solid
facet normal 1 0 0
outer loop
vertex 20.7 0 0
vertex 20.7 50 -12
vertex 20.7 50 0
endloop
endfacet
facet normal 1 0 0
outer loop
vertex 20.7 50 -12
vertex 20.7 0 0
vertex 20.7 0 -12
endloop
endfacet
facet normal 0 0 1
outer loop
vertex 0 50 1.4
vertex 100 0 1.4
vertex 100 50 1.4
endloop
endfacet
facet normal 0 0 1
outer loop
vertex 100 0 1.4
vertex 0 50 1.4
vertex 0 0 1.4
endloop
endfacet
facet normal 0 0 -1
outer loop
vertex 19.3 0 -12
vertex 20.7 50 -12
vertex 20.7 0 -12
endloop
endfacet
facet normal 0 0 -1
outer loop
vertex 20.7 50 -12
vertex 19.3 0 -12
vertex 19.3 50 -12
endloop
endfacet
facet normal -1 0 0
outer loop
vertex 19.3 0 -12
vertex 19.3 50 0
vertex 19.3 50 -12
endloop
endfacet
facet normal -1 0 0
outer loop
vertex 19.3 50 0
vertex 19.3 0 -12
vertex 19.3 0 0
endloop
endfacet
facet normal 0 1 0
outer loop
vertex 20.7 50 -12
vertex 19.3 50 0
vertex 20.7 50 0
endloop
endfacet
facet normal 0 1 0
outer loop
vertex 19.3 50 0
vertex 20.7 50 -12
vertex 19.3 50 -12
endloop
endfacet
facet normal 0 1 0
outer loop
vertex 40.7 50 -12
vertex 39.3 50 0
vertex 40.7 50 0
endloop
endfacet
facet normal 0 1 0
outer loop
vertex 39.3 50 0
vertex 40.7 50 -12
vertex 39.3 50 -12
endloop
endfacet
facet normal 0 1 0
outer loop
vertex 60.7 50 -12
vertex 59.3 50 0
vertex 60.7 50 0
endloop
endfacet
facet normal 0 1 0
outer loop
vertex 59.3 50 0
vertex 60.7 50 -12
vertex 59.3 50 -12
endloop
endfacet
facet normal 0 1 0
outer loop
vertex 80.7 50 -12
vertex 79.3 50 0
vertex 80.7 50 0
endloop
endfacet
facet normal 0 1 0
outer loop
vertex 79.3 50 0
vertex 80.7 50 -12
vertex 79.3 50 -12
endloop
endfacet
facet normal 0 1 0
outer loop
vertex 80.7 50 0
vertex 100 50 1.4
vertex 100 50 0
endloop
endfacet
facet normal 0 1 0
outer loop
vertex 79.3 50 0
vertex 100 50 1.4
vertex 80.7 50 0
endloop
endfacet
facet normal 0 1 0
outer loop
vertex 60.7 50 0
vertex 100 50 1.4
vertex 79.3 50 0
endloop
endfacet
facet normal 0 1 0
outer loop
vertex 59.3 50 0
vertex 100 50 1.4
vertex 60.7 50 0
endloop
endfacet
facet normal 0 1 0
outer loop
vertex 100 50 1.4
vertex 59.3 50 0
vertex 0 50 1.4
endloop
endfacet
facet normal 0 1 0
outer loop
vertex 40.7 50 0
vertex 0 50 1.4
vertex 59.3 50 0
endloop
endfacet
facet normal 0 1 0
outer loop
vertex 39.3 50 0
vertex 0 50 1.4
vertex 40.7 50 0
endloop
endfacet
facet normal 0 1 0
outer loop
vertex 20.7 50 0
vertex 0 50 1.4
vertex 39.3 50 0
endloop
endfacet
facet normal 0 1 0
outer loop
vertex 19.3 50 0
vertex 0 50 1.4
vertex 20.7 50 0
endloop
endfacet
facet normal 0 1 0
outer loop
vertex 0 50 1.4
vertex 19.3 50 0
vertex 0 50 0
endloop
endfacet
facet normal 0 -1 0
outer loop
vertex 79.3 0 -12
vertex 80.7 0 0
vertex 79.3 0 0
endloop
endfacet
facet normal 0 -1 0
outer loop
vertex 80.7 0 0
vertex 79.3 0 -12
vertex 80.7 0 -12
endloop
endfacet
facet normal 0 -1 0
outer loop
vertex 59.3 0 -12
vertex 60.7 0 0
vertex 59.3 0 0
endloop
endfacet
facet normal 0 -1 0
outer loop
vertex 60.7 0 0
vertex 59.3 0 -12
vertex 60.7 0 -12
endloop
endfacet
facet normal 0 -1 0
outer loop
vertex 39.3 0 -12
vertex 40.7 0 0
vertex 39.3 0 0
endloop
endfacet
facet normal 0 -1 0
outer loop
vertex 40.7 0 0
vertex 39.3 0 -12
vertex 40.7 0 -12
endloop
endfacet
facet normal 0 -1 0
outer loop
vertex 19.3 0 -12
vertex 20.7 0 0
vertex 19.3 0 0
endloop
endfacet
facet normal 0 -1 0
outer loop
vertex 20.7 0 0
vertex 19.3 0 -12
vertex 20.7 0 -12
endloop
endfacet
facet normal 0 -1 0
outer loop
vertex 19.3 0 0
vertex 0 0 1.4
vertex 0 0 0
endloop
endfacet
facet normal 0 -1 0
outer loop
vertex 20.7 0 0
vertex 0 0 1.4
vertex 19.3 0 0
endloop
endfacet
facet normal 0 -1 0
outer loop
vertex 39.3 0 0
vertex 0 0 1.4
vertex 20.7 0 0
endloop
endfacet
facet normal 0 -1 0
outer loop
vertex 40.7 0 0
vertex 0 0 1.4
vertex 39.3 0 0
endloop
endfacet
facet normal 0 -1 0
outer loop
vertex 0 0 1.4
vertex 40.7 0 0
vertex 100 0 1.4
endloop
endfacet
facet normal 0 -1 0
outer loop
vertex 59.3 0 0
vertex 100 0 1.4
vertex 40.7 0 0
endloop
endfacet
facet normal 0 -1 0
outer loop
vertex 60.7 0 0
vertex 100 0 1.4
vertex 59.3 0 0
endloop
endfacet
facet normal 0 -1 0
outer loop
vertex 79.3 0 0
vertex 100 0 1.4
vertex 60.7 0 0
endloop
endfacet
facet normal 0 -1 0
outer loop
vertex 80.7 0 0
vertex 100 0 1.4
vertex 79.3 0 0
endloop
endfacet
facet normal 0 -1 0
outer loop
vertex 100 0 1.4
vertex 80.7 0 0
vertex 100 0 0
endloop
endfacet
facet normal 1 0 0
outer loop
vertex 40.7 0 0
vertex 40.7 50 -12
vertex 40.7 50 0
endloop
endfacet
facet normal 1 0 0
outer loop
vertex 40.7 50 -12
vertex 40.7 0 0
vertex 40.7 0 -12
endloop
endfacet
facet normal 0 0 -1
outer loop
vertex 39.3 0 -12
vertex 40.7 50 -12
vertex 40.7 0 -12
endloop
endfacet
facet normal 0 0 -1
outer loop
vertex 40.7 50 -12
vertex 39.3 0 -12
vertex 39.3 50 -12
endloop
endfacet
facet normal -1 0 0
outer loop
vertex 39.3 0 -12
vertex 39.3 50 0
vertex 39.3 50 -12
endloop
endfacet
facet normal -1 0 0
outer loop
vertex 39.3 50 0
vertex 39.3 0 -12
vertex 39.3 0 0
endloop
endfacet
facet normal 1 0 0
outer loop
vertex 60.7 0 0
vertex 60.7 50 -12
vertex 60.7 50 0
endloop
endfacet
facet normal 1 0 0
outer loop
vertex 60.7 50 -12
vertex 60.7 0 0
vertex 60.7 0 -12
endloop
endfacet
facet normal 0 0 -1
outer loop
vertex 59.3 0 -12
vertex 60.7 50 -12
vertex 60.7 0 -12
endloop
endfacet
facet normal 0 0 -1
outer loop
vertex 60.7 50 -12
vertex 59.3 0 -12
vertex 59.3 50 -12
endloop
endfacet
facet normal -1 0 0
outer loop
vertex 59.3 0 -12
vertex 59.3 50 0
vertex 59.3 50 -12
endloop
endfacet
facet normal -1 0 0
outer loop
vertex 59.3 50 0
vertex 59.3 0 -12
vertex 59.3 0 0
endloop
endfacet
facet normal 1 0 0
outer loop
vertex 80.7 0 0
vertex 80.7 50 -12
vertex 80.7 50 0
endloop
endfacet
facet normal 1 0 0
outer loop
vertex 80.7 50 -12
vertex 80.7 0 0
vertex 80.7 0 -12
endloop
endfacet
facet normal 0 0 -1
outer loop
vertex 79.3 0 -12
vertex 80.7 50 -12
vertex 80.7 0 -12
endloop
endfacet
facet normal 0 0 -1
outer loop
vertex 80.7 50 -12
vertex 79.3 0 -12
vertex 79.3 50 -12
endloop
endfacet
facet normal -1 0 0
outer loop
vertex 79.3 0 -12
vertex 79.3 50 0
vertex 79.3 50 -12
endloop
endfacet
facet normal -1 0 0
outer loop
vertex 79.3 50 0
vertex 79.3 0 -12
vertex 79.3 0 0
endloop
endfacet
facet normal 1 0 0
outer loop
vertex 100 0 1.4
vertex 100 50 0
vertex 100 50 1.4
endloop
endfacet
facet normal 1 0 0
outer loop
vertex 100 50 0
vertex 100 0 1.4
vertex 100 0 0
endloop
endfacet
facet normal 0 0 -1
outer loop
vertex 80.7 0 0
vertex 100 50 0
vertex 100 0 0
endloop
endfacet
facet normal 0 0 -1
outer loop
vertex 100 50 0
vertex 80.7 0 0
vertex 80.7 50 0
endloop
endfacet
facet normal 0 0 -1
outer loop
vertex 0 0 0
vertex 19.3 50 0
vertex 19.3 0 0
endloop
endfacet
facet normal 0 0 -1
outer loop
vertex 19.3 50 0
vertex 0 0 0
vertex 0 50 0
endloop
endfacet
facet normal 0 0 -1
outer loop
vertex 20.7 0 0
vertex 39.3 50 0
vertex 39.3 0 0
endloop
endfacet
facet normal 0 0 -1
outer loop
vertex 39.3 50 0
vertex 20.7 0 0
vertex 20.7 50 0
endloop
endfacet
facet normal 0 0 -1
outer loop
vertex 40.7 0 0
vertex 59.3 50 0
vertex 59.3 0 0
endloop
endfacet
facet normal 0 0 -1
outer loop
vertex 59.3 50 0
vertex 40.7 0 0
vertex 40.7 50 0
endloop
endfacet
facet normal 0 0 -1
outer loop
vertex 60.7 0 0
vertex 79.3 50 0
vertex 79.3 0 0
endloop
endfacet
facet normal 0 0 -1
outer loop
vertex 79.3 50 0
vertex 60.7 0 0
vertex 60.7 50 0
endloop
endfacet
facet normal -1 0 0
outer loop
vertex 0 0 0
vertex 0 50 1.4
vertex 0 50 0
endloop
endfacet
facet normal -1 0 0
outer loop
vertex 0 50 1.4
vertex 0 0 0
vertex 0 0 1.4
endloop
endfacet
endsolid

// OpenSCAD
$fn = 32;

// ----------------------------------------------------------------------
// Ribbed panel: 1.4 mm panel
// ----------------------------------------------------------------------

// --- parameters (mm) ---
panel_l = 100;            // panel length, X
panel_w = 50;             // panel width, Y
panel_t = 1.4;            // panel thickness, Z
rib_t = 1.4;              // rib thickness
rib_h = 12;               // rib height below the panel
ribs = 4;                 // number of ribs

total_h = panel_t + rib_h;  // overall height

union() {
  cube([panel_l, panel_w, panel_t]);
  for (i = [1 : ribs])
    translate([i * panel_l / (ribs + 1) - rib_t / 2, 0, -rib_h])
      cube([rib_t, panel_w, rib_h + panel_t]);
}
